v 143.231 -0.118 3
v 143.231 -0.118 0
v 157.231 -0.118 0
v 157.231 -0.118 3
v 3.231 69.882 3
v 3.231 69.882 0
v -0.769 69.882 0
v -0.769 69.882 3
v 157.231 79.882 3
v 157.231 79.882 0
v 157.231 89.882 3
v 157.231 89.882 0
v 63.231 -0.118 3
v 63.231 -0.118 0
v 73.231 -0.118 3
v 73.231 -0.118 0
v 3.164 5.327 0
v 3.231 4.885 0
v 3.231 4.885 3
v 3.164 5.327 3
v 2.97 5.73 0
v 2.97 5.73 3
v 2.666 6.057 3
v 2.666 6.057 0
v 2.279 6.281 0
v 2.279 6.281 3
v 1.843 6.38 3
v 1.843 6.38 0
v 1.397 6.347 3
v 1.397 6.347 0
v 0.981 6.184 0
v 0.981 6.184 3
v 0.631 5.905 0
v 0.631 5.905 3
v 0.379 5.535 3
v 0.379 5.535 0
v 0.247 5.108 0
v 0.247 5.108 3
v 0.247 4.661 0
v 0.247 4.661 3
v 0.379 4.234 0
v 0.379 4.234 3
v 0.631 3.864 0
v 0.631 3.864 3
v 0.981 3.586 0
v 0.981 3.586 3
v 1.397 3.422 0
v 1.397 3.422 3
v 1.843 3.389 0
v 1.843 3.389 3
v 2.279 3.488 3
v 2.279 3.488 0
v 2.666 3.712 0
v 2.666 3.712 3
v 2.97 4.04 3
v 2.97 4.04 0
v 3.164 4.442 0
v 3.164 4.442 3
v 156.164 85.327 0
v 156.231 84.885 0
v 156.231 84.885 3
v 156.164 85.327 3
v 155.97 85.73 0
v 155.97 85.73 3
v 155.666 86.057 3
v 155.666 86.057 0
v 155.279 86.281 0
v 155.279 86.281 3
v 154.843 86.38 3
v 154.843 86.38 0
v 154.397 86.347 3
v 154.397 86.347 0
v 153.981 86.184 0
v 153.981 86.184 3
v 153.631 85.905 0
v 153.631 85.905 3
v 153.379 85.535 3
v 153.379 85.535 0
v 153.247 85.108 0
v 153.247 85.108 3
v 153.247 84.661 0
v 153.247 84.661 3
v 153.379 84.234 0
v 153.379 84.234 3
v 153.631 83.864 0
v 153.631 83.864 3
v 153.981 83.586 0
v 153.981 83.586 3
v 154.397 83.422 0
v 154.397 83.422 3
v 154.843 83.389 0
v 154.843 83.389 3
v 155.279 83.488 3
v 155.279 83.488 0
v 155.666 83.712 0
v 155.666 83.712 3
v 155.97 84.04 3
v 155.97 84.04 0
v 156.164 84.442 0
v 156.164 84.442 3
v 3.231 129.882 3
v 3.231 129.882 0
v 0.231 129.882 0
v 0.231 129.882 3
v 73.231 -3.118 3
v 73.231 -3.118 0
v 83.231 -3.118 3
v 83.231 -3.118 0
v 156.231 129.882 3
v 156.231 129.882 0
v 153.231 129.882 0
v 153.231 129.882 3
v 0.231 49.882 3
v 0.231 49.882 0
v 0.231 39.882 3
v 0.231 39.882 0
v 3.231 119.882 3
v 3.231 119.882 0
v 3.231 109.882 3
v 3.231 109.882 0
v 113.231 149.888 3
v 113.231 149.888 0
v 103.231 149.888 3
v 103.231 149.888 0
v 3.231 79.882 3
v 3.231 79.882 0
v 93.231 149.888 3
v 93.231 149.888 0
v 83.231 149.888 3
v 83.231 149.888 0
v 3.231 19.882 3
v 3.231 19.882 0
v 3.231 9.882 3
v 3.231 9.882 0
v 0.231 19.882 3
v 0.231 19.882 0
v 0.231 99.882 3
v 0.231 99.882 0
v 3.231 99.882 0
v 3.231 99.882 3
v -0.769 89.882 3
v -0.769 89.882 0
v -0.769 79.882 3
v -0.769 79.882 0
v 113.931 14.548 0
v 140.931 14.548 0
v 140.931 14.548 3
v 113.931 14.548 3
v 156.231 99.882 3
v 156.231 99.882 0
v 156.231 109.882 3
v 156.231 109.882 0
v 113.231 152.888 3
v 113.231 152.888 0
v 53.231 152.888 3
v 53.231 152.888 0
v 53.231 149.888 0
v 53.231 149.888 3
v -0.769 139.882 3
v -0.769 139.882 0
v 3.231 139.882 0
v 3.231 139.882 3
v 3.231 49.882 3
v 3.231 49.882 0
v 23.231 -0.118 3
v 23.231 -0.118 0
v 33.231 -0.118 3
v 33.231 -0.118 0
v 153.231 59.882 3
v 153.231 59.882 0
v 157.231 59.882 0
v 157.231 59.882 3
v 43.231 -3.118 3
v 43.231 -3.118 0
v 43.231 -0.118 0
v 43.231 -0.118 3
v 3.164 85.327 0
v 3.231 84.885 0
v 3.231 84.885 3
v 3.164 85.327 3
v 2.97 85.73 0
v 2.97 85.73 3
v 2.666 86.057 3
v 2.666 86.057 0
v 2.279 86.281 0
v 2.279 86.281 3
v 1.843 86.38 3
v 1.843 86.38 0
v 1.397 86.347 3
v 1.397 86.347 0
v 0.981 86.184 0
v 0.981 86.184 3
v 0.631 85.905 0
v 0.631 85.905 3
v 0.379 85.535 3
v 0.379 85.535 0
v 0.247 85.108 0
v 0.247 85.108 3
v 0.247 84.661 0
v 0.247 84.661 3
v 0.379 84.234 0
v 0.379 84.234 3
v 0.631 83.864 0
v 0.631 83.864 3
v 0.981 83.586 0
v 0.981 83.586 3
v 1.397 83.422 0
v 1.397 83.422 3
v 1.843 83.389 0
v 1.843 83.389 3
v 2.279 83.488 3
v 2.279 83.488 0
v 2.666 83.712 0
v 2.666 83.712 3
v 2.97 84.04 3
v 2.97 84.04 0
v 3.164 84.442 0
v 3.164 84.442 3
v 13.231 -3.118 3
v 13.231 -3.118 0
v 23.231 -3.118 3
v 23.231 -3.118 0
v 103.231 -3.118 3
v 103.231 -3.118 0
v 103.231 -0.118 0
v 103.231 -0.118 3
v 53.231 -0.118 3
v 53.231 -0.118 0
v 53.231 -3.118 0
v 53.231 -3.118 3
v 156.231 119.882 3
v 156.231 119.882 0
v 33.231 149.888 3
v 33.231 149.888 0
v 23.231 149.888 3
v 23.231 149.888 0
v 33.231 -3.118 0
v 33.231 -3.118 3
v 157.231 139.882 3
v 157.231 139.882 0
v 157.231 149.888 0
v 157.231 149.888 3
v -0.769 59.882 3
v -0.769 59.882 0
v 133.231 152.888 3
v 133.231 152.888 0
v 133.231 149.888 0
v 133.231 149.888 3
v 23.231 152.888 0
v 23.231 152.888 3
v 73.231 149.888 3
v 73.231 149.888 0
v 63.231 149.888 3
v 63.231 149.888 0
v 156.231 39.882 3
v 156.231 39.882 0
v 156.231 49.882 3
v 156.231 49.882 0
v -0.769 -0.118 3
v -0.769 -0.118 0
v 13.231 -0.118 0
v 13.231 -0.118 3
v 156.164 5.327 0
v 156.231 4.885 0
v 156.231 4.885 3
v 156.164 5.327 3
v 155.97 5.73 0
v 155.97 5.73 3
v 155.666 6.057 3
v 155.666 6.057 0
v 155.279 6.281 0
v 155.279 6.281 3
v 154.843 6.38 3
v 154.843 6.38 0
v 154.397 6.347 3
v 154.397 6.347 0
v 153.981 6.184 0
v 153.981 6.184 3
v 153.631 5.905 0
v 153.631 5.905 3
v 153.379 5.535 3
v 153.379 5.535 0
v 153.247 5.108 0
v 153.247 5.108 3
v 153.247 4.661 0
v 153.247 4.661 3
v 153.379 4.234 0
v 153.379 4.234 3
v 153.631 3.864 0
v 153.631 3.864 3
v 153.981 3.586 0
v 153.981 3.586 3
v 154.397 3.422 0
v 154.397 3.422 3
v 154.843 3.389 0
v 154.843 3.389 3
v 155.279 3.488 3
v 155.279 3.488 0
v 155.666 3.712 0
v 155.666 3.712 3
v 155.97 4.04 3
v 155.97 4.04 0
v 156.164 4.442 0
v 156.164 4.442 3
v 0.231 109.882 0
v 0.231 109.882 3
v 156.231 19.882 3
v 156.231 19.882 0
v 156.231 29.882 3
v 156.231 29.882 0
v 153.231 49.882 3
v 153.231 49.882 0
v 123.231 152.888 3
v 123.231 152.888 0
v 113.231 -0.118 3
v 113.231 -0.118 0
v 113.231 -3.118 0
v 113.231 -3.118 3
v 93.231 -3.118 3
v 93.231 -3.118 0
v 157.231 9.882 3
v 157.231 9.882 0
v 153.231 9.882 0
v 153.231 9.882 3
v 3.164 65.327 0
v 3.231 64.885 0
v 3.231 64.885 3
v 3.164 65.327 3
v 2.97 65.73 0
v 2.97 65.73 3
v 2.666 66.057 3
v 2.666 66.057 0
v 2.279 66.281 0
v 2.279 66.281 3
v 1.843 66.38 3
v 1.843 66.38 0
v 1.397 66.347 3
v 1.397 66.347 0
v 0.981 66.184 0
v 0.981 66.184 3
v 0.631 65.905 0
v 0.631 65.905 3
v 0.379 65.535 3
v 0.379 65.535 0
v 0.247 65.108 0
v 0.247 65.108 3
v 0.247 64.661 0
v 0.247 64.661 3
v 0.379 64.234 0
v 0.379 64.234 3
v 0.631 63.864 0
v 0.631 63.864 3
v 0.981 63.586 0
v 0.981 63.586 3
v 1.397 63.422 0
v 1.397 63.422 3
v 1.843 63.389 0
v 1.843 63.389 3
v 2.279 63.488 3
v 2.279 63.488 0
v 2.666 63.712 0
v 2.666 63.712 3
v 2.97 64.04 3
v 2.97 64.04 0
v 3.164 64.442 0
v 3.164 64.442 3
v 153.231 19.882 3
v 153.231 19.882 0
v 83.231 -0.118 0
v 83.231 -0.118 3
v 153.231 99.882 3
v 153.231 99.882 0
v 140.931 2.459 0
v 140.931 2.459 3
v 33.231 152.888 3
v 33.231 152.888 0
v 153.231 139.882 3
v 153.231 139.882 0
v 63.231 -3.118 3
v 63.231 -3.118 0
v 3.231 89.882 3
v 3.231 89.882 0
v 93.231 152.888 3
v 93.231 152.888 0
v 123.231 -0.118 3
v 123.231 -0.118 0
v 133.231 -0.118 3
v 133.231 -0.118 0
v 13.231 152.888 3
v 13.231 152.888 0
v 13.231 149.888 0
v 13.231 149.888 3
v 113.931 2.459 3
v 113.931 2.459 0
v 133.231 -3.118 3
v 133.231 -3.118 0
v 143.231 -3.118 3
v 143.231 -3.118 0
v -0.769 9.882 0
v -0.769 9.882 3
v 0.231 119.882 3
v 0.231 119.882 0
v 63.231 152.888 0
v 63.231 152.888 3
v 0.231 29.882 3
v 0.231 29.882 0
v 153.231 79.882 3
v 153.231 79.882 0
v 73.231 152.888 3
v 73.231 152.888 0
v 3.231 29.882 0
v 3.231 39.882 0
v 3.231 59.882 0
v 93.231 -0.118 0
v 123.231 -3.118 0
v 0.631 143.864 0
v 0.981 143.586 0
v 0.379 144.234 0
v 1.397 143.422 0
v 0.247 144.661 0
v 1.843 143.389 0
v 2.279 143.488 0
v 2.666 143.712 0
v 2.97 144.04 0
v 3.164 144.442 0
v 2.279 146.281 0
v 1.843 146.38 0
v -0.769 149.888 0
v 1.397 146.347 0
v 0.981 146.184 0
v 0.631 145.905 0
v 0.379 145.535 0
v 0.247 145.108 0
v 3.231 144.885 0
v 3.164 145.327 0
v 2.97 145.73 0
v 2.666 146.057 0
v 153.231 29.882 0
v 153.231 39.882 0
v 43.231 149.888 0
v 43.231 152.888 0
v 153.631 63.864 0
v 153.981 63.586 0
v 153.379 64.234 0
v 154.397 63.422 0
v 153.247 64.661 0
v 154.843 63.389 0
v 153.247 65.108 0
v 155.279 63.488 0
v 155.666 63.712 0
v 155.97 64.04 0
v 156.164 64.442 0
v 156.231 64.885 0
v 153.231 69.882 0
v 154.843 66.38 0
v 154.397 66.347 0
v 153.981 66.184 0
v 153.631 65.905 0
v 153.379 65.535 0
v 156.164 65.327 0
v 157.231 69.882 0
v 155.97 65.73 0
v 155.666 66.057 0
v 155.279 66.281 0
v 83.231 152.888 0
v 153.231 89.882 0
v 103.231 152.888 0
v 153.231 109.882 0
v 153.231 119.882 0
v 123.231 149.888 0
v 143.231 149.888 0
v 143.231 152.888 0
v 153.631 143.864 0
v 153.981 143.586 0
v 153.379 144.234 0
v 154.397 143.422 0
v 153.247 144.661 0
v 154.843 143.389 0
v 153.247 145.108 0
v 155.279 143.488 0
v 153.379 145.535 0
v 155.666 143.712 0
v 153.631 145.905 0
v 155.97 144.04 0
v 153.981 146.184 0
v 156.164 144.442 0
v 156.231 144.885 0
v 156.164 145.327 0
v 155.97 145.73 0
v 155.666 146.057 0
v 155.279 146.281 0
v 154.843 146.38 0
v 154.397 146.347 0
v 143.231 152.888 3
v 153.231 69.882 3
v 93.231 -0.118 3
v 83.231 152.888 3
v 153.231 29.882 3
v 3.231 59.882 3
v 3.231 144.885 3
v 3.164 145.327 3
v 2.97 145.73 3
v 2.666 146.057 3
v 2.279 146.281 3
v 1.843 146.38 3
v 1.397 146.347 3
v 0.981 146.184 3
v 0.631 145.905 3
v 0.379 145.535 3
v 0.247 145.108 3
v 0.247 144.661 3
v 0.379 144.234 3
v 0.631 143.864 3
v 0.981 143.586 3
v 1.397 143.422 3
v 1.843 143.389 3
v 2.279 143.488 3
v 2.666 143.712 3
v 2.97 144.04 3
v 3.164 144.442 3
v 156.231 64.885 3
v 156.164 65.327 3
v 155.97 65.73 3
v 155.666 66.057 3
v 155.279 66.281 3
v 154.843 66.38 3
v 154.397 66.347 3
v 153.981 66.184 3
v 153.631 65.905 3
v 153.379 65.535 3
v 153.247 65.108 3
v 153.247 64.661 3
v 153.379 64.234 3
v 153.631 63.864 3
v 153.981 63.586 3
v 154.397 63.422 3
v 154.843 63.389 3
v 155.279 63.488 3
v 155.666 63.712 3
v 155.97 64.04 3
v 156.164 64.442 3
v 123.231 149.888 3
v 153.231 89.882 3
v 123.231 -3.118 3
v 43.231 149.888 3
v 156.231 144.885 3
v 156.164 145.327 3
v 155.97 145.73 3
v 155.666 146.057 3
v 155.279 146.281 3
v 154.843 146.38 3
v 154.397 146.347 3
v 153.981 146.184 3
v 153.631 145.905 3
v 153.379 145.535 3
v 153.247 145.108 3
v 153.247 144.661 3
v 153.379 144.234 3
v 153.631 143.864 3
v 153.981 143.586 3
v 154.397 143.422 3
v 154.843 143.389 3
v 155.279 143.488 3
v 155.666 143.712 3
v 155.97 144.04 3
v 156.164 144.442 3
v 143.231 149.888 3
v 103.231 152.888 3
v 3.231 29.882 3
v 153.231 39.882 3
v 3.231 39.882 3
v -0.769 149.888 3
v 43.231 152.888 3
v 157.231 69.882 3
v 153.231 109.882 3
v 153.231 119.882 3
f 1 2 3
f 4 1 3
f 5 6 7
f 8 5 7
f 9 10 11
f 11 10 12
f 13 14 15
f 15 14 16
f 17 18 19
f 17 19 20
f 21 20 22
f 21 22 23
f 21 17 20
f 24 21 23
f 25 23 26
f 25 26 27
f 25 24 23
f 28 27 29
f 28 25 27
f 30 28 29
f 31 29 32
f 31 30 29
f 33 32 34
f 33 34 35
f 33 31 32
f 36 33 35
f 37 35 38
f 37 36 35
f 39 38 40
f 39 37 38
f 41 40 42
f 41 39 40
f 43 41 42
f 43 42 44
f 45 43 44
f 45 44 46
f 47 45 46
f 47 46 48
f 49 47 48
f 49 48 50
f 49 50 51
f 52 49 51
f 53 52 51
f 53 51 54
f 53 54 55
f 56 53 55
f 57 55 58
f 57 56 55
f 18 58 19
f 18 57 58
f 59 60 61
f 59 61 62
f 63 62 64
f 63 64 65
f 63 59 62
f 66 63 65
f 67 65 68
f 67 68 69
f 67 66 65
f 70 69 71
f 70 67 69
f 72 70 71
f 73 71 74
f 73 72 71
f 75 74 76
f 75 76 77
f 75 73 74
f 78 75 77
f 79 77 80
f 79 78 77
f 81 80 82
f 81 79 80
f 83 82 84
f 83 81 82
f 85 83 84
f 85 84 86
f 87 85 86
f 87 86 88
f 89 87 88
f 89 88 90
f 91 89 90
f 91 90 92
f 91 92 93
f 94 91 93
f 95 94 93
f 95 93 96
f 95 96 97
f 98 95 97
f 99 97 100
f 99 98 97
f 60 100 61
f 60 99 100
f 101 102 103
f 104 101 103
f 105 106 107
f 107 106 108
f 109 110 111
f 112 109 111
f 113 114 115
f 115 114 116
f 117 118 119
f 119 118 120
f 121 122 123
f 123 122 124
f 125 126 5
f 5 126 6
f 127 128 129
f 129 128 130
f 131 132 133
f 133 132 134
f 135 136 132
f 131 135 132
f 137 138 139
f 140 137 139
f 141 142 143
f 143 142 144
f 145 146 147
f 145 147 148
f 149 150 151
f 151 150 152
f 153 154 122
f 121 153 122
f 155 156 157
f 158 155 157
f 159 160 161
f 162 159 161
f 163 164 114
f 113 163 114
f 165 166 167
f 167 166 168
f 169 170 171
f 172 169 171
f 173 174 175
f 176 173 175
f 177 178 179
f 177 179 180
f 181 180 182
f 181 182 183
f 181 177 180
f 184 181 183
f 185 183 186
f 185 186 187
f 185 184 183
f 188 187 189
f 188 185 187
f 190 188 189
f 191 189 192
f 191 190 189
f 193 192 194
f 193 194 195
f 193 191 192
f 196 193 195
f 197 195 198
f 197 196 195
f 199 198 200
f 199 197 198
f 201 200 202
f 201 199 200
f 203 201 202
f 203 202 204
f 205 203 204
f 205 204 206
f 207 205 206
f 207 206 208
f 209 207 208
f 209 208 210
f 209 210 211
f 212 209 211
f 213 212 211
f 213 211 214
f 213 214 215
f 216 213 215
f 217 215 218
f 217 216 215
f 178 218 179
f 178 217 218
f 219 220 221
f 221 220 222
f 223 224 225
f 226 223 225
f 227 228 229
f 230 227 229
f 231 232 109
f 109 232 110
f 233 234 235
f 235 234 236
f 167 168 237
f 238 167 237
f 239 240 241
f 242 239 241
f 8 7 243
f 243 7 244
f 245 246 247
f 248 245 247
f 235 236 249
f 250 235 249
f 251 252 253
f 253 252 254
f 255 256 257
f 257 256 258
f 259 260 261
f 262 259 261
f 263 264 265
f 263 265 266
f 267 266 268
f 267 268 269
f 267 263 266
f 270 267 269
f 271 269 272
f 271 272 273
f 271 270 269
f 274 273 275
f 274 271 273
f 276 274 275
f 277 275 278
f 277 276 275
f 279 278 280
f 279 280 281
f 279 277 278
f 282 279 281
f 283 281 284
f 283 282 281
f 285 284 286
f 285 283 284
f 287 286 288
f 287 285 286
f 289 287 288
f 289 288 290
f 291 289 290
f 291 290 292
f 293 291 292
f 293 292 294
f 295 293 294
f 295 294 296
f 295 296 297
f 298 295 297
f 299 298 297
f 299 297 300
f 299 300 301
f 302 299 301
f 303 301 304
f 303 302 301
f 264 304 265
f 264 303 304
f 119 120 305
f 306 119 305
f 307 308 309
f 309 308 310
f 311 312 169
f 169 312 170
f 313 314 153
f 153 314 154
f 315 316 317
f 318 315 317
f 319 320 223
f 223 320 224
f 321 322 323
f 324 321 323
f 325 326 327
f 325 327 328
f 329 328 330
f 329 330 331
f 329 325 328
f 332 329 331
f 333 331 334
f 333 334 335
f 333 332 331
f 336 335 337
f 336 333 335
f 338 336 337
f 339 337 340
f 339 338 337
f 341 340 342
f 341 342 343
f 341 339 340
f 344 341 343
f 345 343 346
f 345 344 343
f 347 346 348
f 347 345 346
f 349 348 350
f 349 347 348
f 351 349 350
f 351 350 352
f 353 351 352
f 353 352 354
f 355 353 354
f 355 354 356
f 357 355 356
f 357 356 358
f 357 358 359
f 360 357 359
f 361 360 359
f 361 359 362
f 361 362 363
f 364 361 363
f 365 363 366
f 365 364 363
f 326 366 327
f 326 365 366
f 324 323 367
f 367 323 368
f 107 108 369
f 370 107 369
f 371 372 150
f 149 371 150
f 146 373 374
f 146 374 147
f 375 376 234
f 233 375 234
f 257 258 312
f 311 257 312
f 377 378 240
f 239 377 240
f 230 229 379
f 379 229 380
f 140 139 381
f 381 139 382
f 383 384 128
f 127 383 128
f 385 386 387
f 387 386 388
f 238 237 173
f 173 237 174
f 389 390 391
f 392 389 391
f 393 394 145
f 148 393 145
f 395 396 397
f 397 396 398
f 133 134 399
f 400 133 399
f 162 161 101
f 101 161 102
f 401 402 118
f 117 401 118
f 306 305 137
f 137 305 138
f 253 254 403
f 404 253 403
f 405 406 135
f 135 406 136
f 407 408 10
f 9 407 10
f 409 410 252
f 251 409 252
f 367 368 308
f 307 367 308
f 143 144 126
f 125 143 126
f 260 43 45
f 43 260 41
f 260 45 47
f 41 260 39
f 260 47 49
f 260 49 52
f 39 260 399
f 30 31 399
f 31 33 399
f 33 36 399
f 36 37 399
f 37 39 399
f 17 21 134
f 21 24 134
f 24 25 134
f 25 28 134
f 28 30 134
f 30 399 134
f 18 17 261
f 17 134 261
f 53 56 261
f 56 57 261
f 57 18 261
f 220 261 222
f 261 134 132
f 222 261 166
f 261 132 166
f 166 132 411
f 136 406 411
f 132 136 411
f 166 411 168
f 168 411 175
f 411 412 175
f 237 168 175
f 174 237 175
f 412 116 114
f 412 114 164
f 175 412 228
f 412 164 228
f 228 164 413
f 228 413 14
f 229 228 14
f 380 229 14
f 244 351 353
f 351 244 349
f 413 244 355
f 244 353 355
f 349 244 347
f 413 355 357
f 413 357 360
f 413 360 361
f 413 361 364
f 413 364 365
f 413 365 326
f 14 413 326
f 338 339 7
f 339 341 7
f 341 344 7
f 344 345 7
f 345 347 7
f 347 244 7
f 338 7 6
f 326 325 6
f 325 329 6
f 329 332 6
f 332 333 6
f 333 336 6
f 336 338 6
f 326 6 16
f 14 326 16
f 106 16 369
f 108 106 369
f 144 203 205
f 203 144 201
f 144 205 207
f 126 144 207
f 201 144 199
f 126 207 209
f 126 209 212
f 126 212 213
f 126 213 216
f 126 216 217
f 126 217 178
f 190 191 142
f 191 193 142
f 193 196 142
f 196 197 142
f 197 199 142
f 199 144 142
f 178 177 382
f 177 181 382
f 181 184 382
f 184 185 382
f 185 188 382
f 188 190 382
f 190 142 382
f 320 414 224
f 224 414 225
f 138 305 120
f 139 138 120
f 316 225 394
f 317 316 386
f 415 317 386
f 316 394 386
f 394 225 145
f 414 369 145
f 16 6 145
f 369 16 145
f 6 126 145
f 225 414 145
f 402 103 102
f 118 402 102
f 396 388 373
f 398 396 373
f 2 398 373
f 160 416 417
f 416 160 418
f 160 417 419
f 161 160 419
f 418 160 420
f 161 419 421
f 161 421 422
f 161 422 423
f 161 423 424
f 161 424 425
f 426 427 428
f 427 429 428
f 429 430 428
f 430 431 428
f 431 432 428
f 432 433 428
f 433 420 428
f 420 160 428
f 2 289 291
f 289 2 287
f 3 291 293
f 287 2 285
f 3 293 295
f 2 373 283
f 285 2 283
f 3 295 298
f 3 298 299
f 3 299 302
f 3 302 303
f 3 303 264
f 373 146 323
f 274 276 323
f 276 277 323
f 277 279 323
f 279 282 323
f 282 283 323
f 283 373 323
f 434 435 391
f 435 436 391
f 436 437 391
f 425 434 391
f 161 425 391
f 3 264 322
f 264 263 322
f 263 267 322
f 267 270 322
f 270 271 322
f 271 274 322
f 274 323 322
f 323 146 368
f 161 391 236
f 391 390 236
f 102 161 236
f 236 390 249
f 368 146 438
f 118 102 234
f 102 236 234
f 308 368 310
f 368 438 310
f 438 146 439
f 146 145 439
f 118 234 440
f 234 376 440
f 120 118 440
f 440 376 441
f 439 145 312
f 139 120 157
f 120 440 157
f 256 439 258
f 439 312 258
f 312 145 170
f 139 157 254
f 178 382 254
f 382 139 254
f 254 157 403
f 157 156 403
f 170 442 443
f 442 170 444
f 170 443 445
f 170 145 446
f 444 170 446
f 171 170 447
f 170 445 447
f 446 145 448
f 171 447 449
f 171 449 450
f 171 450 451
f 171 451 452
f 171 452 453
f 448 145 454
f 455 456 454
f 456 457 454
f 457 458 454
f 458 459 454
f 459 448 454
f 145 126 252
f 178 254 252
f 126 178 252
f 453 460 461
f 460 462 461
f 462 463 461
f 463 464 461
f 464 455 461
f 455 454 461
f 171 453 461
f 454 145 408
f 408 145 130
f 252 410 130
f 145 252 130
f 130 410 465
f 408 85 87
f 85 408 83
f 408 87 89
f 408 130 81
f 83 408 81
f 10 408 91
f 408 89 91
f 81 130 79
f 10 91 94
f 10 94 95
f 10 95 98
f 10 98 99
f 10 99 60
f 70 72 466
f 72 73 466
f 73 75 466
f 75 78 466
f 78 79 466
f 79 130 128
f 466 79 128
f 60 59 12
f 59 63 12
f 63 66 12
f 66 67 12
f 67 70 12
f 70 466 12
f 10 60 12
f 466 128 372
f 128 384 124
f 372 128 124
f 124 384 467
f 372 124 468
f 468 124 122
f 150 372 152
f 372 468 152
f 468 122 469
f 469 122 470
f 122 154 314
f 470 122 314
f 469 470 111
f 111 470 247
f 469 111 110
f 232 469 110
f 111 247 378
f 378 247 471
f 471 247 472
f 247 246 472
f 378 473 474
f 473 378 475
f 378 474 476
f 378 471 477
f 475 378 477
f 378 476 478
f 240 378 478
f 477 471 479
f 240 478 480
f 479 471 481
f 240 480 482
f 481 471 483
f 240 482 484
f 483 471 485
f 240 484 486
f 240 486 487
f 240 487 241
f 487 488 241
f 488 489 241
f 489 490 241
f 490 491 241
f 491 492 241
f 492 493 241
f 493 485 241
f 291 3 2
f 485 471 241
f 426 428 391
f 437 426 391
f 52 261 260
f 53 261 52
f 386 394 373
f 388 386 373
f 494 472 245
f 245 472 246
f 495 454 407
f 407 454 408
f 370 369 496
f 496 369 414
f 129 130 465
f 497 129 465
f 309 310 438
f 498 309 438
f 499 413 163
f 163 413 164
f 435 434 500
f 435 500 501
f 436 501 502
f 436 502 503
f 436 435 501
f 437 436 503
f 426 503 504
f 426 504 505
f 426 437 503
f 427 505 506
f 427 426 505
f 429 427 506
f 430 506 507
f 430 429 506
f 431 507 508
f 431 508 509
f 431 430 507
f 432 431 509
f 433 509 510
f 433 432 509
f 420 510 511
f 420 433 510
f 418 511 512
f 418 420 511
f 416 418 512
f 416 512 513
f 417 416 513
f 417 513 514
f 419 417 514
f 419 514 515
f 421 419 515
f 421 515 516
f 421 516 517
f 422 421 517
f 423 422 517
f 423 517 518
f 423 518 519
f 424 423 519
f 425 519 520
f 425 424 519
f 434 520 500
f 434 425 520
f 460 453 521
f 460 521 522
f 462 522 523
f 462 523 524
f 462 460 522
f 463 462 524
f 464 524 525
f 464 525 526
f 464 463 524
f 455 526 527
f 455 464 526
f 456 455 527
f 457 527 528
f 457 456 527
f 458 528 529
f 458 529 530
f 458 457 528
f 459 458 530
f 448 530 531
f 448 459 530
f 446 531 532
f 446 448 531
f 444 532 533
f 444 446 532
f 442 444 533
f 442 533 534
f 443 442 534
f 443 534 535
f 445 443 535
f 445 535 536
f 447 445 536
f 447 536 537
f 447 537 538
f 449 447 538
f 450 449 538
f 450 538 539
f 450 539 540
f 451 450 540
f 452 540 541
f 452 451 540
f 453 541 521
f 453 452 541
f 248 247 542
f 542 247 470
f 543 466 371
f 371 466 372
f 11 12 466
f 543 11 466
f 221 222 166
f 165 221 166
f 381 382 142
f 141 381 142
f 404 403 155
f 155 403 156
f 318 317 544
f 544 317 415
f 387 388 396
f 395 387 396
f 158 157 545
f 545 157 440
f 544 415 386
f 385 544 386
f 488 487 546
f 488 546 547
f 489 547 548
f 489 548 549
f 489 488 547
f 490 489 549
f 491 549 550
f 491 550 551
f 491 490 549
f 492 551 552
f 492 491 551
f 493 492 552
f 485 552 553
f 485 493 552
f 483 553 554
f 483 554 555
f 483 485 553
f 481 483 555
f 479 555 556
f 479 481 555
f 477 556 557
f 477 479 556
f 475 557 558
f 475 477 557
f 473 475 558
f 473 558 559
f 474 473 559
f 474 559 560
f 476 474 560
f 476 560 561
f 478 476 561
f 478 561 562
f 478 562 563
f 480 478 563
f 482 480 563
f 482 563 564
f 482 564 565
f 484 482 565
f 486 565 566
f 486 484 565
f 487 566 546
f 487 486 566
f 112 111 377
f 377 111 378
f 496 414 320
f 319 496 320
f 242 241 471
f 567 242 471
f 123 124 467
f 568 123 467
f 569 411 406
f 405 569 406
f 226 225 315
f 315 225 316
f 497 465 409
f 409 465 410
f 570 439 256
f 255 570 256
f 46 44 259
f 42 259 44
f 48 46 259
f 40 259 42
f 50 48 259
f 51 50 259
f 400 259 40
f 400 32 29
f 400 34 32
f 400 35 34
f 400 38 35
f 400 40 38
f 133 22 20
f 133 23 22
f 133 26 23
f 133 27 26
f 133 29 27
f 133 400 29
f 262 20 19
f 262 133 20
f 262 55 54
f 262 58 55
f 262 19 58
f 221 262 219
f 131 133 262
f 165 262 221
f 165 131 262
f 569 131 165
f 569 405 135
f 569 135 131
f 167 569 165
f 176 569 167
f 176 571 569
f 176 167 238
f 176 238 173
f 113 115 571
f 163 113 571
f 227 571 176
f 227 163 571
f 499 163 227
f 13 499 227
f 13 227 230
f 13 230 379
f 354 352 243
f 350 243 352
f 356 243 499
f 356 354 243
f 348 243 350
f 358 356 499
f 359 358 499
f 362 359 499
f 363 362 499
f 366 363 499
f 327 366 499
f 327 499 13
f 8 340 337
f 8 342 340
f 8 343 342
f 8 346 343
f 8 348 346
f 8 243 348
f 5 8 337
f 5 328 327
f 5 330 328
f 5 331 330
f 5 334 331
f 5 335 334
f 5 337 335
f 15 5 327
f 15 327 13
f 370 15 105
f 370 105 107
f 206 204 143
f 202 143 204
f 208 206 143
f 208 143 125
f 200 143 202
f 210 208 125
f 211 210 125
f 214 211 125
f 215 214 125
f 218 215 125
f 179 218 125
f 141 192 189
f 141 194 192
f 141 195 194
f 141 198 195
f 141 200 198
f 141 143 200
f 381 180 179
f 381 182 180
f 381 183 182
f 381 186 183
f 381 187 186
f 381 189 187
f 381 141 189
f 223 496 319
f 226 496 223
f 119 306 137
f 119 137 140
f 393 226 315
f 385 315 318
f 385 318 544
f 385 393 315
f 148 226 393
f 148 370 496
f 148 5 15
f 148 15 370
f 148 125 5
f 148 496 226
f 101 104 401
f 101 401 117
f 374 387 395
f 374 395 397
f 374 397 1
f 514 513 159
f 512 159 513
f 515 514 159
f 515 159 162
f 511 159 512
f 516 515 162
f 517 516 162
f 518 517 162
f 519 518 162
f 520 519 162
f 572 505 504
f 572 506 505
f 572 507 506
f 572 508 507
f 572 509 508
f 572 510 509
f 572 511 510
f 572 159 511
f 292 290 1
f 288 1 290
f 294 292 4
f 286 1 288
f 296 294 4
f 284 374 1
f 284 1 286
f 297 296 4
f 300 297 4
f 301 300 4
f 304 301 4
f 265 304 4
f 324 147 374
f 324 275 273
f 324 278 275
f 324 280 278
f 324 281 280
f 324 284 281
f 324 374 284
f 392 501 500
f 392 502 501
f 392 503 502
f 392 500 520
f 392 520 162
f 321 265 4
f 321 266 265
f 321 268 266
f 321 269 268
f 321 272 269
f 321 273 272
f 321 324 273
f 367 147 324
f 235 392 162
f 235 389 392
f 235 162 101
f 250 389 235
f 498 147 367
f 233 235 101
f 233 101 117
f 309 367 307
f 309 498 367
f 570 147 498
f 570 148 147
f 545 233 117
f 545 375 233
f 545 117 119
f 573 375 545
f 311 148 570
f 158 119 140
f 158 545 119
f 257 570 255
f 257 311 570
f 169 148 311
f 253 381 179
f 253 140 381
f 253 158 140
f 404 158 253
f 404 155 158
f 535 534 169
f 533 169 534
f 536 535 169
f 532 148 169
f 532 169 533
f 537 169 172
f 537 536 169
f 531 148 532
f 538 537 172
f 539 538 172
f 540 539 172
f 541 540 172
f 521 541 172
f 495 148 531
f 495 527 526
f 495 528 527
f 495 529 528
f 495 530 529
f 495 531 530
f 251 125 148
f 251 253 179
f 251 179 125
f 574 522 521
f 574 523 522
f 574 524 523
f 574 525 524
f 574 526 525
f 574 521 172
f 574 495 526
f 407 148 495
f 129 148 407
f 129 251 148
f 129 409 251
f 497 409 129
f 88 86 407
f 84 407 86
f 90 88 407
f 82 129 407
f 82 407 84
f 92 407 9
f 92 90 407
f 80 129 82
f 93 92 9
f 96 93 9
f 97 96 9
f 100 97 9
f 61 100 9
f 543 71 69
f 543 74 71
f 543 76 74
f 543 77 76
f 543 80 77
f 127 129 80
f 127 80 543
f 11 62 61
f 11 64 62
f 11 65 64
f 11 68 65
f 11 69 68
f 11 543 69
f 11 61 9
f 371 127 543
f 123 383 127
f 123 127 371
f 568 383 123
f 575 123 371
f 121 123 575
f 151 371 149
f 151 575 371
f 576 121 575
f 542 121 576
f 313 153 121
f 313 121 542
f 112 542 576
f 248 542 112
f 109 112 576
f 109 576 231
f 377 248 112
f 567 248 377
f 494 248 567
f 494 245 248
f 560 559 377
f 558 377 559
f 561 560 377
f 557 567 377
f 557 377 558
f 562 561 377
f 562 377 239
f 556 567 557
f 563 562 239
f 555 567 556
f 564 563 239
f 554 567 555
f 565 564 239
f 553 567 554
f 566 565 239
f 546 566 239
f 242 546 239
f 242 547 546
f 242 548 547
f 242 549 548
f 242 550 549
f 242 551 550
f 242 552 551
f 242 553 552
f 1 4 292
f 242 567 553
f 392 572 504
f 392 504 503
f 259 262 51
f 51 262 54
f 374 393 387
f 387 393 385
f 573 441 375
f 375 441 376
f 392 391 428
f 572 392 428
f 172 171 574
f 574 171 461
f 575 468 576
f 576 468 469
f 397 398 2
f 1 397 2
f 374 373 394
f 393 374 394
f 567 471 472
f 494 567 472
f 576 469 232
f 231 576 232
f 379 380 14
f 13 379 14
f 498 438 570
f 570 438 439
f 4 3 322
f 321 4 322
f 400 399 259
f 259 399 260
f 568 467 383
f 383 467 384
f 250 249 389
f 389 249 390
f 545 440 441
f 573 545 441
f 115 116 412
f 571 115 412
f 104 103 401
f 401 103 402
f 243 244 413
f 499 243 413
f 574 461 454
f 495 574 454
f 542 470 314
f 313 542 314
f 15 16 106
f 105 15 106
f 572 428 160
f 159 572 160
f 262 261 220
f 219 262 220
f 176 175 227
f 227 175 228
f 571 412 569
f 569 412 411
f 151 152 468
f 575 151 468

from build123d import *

# Parameters (mm, degrees)
SKETCH2_R           = 1.5
BOSS_EXTRUDE2_DEPTH = 3
SKETCH3_W           = 27
SKETCH3_H           = 12.089495281
CUT_EXTRUDE1_DEPTH  = 10


with BuildPart() as part:
    # Sketch2 → Boss-Extrude2 (new body)
    with BuildSketch(Plane.XY):
        Polygon((143.230702788, -0.118374558), (153.230702788, -0.118374558), (157.230702788, -0.118374558), (157.230702788, 9.881625442), (153.230702788, 9.881625442), (153.230702788, 19.881625442), (156.230702788, 19.881625442), (156.230702788, 29.881625442), (153.230702788, 29.881625442), (153.230702788, 39.881625442), (156.230702788, 39.881625442), (156.230702788, 49.881625442), (153.230702788, 49.881625442), (153.230702788, 59.881625442), (157.230702788, 59.881625442), (157.230702788, 69.881625442), (153.230702788, 69.881625442), (153.230702788, 79.881625442), (157.230702788, 79.881625442), (157.230702788, 89.881625442), (153.230702788, 89.881625442), (153.230702788, 99.881625442), (156.230702788, 99.881625442), (156.230702788, 109.881625442), (153.230702788, 109.881625442), (153.230702788, 119.881625442), (156.230702788, 119.881625442), (156.230702788, 129.881625442), (153.230702788, 129.881625442), (153.230702788, 139.881625442), (157.230702788, 139.881625442), (157.230702788, 149.88750096), (153.230702788, 149.88750096), (143.230702788, 149.88750096), (143.230702788, 152.88750096), (133.230702788, 152.88750096), (133.230702788, 149.88750096), (123.230702788, 149.88750096), (123.230702788, 152.88750096), (113.230702788, 152.88750096), (113.230702788, 149.88750096), (103.230702788, 149.88750096), (103.230702788, 152.88750096), (93.230702788, 152.88750096), (93.230702788, 149.88750096), (83.230702788, 149.88750096), (83.230702788, 152.88750096), (73.230702788, 152.88750096), (73.230702788, 149.88750096), (63.230702788, 149.88750096), (63.230702788, 152.88750096), (53.230702788, 152.88750096), (53.230702788, 149.88750096), (43.230702788, 149.88750096), (43.230702788, 152.88750096), (33.230702788, 152.88750096), (33.230702788, 149.88750096), (23.230702788, 149.88750096), (23.230702788, 152.88750096), (13.230702788, 152.88750096), (13.230702788, 149.88750096), (3.230702788, 149.88750096), (-0.769297212, 149.88750096), (-0.769297212, 139.881625442), (3.230702788, 139.881625442), (3.230702788, 129.881625442), (0.230702788, 129.881625442), (0.230702788, 119.881625442), (3.230702788, 119.881625442), (3.230702788, 109.881625442), (0.230702788, 109.881625442), (0.230702788, 99.881625442), (3.230702788, 99.881625442), (3.230702788, 89.881625442), (-0.769297212, 89.881625442), (-0.769297212, 79.881625442), (3.230702788, 79.881625442), (3.230702788, 69.881625442), (-0.769297212, 69.881625442), (-0.769297212, 59.881625442), (3.230702788, 59.881625442), (3.230702788, 49.881625442), (0.230702788, 49.881625442), (0.230702788, 39.881625442), (3.230702788, 39.881625442), (3.230702788, 29.881625442), (0.230702788, 29.881625442), (0.230702788, 19.881625442), (3.230702788, 19.881625442), (3.230702788, 9.881625442), (-0.769297212, 9.881625442), (-0.769297212, -0.118374558), (3.230702788, -0.118374558), (13.230702788, -0.118374558), (13.230702788, -3.118374558), (23.230702788, -3.118374558), (23.230702788, -0.118374558), (33.230702788, -0.118374558), (33.230702788, -3.118374558), (43.230702788, -3.118374558), (43.230702788, -0.118374558), (53.230702788, -0.118374558), (53.230702788, -3.118374558), (63.230702788, -3.118374558), (63.230702788, -0.118374558), (73.230702788, -0.118374558), (73.230702788, -3.118374558), (83.230702788, -3.118374558), (83.230702788, -0.118374558), (93.230702788, -0.118374558), (93.230702788, -3.118374558), (103.230702788, -3.118374558), (103.230702788, -0.118374558), (113.230702788, -0.118374558), (113.230702788, -3.118374558), (123.230702788, -3.118374558), (123.230702788, -0.118374558), (133.230702788, -0.118374558), (133.230702788, -3.118374558), (143.230702788, -3.118374558), align=None)
        with Locations((1.730702788, 4.884563201)):
            Circle(SKETCH2_R, mode=Mode.SUBTRACT)
        with Locations((1.730702788, 64.884563201)):
            Circle(SKETCH2_R, mode=Mode.SUBTRACT)
        with Locations((154.730702788, 4.884563201)):
            Circle(SKETCH2_R, mode=Mode.SUBTRACT)
        with Locations((154.730702788, 64.884563201)):
            Circle(SKETCH2_R, mode=Mode.SUBTRACT)
        with Locations((1.730702788, 84.884563201)):
            Circle(SKETCH2_R, mode=Mode.SUBTRACT)
        with Locations((1.730702788, 144.884563201)):
            Circle(SKETCH2_R, mode=Mode.SUBTRACT)
        with Locations((154.730702788, 84.884563201)):
            Circle(SKETCH2_R, mode=Mode.SUBTRACT)
        with Locations((154.730702788, 144.884563201)):
            Circle(SKETCH2_R, mode=Mode.SUBTRACT)
    extrude(amount=BOSS_EXTRUDE2_DEPTH)

    # Sketch3 → Cut-Extrude1 (cut)
    with BuildSketch(Plane(origin=(0, 0, 0), x_dir=(-1, 0, 0), z_dir=(0, 0, -1))):
        with Locations((-127.430702788, 8.503599334)):
            Rectangle(SKETCH3_W, SKETCH3_H)
    extrude(amount=-CUT_EXTRUDE1_DEPTH, mode=Mode.SUBTRACT)


solid = part.part
